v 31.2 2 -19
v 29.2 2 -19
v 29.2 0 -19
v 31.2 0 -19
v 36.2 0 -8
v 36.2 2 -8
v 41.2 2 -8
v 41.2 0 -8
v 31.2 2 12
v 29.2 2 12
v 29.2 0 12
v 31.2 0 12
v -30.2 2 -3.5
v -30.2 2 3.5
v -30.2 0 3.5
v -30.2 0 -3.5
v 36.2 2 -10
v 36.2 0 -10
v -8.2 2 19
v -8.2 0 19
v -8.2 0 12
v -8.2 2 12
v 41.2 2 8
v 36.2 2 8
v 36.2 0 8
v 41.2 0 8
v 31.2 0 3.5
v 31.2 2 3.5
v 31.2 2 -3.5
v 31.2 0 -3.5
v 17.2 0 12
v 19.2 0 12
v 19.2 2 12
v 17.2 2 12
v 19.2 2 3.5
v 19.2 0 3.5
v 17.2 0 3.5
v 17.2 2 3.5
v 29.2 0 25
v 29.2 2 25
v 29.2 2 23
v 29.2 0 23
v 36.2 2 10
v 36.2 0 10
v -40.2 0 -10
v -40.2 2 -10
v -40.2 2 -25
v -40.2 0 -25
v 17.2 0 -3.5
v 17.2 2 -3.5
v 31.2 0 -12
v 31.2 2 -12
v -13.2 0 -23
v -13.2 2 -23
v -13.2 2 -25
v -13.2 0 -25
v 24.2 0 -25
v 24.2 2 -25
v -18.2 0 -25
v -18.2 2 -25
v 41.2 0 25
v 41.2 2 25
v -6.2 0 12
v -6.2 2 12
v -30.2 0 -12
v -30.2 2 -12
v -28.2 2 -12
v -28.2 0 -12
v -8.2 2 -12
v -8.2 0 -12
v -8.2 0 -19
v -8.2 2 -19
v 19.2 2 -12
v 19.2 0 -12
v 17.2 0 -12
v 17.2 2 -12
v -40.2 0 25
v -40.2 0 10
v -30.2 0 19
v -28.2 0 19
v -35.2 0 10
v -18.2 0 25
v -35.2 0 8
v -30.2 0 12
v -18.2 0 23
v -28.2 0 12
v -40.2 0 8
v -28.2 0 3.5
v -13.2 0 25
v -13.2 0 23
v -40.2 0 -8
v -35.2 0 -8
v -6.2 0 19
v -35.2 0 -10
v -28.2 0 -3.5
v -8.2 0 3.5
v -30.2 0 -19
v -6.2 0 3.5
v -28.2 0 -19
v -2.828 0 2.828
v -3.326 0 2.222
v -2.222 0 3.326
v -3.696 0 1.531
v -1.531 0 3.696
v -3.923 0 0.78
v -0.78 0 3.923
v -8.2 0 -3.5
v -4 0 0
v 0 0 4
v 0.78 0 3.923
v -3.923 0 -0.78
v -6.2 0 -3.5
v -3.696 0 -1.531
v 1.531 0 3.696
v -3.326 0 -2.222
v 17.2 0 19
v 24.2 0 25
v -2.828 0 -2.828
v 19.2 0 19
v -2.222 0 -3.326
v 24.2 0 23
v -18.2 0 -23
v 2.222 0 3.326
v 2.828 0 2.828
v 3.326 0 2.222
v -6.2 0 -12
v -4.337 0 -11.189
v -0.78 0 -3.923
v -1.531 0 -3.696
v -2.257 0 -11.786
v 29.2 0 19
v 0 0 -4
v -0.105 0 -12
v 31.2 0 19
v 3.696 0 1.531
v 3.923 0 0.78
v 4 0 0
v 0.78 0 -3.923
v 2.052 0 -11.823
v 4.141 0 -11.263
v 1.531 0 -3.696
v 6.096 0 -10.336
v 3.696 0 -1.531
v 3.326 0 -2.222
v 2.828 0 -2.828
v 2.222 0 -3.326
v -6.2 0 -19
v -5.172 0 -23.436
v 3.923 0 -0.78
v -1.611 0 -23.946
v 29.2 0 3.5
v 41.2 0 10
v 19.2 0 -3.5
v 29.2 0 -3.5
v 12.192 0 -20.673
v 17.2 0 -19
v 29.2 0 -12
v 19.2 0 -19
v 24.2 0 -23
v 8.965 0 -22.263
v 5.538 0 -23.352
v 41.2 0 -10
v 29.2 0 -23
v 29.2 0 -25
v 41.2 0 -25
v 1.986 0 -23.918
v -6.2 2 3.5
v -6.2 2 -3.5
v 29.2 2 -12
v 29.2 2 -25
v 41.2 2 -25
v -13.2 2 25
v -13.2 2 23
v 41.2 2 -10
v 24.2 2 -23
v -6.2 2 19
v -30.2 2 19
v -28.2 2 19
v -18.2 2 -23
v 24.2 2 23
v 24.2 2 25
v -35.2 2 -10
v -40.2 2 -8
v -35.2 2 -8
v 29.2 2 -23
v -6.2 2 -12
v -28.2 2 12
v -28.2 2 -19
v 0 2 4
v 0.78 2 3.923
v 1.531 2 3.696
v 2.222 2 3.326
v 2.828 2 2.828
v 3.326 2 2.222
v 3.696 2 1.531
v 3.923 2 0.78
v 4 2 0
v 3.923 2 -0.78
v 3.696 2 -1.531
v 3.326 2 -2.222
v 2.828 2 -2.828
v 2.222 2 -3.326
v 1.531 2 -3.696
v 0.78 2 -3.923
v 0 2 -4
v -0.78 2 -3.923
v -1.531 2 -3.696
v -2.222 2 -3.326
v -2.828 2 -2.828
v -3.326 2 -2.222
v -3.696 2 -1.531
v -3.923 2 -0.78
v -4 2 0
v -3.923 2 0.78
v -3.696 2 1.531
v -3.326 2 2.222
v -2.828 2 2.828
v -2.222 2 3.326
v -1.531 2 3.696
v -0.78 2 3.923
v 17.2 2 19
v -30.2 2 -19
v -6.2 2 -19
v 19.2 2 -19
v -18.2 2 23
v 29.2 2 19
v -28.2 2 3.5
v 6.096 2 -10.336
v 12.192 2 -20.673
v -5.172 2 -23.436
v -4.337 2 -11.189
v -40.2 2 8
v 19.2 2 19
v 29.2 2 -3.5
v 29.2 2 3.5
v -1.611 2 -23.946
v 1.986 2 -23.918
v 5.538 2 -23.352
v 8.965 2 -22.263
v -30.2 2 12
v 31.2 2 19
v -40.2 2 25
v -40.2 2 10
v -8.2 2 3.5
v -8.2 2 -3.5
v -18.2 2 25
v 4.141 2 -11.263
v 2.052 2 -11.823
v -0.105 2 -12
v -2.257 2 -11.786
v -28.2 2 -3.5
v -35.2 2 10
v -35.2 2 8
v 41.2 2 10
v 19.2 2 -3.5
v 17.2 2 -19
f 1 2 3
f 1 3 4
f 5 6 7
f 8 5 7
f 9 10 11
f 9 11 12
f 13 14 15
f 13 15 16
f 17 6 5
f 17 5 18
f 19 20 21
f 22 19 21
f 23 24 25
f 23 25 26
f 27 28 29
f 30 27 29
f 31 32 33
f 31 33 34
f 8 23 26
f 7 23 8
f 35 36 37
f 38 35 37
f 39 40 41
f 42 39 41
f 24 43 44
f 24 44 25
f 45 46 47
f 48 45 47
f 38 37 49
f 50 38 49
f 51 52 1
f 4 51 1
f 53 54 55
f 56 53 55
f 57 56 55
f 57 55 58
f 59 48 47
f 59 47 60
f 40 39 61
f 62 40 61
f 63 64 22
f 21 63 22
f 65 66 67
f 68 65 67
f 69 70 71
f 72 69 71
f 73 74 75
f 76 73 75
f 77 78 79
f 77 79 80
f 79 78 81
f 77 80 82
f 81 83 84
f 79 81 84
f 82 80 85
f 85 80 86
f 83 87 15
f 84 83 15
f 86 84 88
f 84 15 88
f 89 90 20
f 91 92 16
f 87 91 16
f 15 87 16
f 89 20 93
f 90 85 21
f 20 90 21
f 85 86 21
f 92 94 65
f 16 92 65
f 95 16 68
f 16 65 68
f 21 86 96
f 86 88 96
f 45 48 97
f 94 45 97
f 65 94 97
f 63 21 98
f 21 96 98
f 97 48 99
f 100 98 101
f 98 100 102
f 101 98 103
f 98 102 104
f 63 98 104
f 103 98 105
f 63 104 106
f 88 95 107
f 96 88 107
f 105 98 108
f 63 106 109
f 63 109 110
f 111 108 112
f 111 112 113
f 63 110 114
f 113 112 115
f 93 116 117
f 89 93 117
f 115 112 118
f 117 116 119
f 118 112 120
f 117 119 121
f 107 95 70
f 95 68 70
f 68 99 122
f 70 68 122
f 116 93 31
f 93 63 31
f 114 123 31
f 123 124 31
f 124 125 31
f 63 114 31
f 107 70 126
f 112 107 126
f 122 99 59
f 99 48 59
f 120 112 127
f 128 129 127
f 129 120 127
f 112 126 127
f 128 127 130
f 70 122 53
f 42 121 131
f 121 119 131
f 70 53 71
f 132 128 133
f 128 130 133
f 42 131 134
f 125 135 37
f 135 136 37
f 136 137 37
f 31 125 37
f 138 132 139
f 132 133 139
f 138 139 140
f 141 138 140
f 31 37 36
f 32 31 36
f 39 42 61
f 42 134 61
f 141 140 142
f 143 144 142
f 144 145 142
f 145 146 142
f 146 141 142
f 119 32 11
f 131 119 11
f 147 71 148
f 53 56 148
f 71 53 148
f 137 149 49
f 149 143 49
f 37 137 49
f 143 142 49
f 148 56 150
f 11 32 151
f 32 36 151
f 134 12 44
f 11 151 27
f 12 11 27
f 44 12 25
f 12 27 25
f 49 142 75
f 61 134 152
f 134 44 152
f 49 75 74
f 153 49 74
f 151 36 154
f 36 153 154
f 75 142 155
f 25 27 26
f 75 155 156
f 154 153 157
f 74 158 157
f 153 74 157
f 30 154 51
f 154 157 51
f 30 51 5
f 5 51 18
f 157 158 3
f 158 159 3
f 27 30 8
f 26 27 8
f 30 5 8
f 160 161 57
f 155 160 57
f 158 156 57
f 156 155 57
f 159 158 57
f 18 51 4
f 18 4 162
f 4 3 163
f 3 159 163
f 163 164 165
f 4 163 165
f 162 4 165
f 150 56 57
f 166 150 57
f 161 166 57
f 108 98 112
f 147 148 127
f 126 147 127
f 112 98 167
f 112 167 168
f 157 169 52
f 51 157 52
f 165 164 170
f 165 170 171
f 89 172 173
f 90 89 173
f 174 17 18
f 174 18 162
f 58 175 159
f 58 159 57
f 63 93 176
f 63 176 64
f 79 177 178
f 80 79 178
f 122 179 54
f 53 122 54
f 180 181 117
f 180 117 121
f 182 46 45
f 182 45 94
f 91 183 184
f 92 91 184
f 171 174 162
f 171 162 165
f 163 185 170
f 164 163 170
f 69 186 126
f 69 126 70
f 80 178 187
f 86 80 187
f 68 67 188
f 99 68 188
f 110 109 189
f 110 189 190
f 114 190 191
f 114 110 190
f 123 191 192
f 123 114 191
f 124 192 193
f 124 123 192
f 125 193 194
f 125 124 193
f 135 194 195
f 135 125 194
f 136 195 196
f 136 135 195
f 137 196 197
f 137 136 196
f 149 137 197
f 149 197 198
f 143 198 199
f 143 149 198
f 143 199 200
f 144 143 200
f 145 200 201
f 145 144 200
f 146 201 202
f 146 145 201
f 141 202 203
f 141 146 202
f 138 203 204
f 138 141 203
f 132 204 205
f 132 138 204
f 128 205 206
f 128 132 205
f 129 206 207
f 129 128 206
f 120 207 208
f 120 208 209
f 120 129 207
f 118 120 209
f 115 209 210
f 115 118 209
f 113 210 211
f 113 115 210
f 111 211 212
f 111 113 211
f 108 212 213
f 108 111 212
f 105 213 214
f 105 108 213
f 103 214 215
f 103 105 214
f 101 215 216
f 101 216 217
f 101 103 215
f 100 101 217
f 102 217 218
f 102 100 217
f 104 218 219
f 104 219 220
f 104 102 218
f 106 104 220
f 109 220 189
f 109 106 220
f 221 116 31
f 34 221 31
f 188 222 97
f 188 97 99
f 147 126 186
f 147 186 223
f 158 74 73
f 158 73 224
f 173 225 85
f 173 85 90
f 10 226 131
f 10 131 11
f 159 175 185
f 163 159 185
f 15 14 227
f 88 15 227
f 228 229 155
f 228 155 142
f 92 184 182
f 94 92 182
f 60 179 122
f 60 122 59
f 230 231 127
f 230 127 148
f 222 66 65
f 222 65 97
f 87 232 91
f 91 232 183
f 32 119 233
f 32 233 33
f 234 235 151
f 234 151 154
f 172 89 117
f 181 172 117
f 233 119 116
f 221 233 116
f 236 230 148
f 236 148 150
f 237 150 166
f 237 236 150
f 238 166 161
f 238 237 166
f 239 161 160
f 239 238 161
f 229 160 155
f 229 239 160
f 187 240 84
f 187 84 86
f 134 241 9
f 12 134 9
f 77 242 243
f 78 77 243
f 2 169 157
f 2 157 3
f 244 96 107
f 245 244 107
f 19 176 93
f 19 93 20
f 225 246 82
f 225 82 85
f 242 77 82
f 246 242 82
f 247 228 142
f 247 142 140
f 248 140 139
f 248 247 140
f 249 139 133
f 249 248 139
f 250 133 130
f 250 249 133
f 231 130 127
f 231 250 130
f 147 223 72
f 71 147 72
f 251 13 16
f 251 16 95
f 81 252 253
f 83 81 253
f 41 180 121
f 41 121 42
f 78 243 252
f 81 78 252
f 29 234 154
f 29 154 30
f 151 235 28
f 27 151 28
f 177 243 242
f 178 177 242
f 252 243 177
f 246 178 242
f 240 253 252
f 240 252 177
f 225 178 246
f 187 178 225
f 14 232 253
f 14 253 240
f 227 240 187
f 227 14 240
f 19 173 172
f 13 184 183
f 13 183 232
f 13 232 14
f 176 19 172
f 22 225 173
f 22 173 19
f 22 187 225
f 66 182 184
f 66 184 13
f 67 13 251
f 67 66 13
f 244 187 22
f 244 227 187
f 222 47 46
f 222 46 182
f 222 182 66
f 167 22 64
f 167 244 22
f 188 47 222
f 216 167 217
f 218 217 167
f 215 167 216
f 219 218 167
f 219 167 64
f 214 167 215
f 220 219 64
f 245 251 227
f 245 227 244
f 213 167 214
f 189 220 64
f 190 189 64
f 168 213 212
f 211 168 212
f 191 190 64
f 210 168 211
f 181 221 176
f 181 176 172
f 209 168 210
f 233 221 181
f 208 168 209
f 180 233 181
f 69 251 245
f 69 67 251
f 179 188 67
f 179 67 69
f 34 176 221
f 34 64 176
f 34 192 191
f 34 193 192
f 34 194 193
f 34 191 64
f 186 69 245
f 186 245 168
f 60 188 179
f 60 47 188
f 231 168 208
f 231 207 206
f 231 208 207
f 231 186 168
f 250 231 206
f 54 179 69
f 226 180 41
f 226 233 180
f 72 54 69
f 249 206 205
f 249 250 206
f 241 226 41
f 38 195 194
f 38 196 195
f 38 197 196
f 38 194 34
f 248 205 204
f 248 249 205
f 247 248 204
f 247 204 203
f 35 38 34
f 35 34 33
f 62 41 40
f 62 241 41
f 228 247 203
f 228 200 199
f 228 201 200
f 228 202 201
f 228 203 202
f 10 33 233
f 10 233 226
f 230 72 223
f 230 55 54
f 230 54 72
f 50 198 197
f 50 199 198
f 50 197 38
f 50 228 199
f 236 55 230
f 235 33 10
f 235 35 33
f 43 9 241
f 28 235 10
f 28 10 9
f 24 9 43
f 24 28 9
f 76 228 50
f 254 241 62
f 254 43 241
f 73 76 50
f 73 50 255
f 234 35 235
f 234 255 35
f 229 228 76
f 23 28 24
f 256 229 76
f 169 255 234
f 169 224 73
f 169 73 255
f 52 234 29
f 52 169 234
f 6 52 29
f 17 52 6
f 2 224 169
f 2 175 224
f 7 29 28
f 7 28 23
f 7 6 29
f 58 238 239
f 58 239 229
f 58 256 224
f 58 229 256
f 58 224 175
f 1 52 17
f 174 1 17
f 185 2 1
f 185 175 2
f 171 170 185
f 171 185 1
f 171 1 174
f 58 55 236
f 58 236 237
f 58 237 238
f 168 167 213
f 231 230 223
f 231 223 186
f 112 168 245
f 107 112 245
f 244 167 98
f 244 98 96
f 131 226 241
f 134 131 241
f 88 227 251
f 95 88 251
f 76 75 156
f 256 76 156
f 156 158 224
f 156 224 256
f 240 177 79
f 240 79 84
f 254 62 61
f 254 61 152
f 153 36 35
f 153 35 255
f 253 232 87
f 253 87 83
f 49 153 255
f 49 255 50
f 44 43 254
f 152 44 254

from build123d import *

# Parameters (mm, degrees)
SKETCH2_W           = 100
SKETCH2_H           = 50
SKETCH2_R           = 4
BOSS_EXTRUDE1_DEPTH = 2
SKETCH5_W           = 2
SKETCH5_H           = 7
CUT_EXTRUDE3_DEPTH  = 2
CUT_EXTRUDE6_DEPTH  = 2
SKETCH11_W          = 5
SKETCH11_H          = 2
CUT_EXTRUDE7_DEPTH  = 2
SKETCH12_W          = 9.8
SKETCH12_H          = 50
SKETCH12_W_2        = 8.8
CUT_EXTRUDE8_DEPTH  = 6
SKETCH13_W          = 2
SKETCH13_H          = 7
SKETCH13_W_2        = 5
SKETCH13_H_2        = 2
CUT_EXTRUDE10_DEPTH = 6


with BuildPart() as part:
    # Sketch2 → Boss-Extrude1 (new body)
    with BuildSketch(Plane(origin=(0, 0, 0), x_dir=(1, 0, 0), z_dir=(0, 1, 0))):
        Rectangle(SKETCH2_W, SKETCH2_H)
        with Locations(Location((0, 0, 0), (0, 0, 270))):
            Circle(SKETCH2_R, mode=Mode.SUBTRACT)
    extrude(amount=BOSS_EXTRUDE1_DEPTH)

    # Sketch5 → Cut-Extrude3 (cut)
    with BuildSketch(Plane(origin=(0, 0, 0), x_dir=(-1, 0, 0), z_dir=(0, -1, 0))):
        with Locations((-18.2, -15.5)):
            Rectangle(SKETCH5_W, SKETCH5_H)
        with Locations((-18.2, 0)):
            Rectangle(SKETCH5_W, SKETCH5_H)
        with Locations((-18.2, 15.5)):
            Rectangle(SKETCH5_W, SKETCH5_H)
        with Locations((7.2, 15.5)):
            Rectangle(SKETCH5_W, SKETCH5_H)
        with Locations((7.2, 0)):
            Rectangle(SKETCH5_W, SKETCH5_H)
        with Locations((7.2, -15.5)):
            Rectangle(SKETCH5_W, SKETCH5_H)
    extrude(amount=-CUT_EXTRUDE3_DEPTH, mode=Mode.SUBTRACT)

    # Sketch10 → Cut-Extrude6 (cut)
    with BuildSketch(Plane(origin=(0, 2, 0), x_dir=(1, 0, 0), z_dir=(0, 1, 0))):
        with BuildLine():
            ThreePointArc((-5.171573663, 23.436186248), (3.772267489, 23.701687661), (12.191771414, 20.672704462))
            Line((12.191771414, 20.672704462), (6.095885707, 10.336352231))
            ThreePointArc((6.095885707, 10.336352231), (0.977437683, 11.960126069), (-4.336736478, 11.188955122))
            Line((-4.336736478, 11.188955122), (-5.171573663, 23.436186248))
        make_face()
    extrude(amount=-CUT_EXTRUDE6_DEPTH, mode=Mode.SUBTRACT)

    # Sketch11 → Cut-Extrude7 (cut)
    with BuildSketch(Plane(origin=(0, 2, 0), x_dir=(1, 0, 0), z_dir=(0, 1, 0))):
        with Locations((-15.7, -24)):
            Rectangle(SKETCH11_W, SKETCH11_H)
        with Locations((26.7, -24)):
            Rectangle(SKETCH11_W, SKETCH11_H)
        with Locations((26.7, 24)):
            Rectangle(SKETCH11_W, SKETCH11_H)
        with Locations((-15.7, 24)):
            Rectangle(SKETCH11_W, SKETCH11_H)
    extrude(amount=-CUT_EXTRUDE7_DEPTH, mode=Mode.SUBTRACT)

    # Sketch12 → Cut-Extrude8 (cut)
    with BuildSketch(Plane(origin=(0, 2, 0), x_dir=(1, 0, 0), z_dir=(0, 1, 0))):
        with Locations((-45.1, 0)):
            Rectangle(SKETCH12_W, SKETCH12_H)
        with Locations((45.6, 0)):
            Rectangle(SKETCH12_W_2, SKETCH12_H)
    extrude(amount=-CUT_EXTRUDE8_DEPTH, mode=Mode.SUBTRACT)

    # Sketch13 → Cut-Extrude10 (cut)
    with BuildSketch(Plane(origin=(0, 2, 0), x_dir=(1, 0, 0), z_dir=(0, 1, 0))):
        with Locations((-29.2, 15.5)):
            Rectangle(SKETCH13_W, SKETCH13_H)
        with Locations((-29.2, 0)):
            Rectangle(SKETCH13_W, SKETCH13_H)
        with Locations((-29.2, -15.5)):
            Rectangle(SKETCH13_W, SKETCH13_H)
        with Locations((30.2, 15.5)):
            Rectangle(SKETCH13_W, SKETCH13_H)
        with Locations((30.2, 0)):
            Rectangle(SKETCH13_W, SKETCH13_H)
        with Locations((30.2, -15.5)):
            Rectangle(SKETCH13_W, SKETCH13_H)
        with Locations((-37.7, 9)):
            Rectangle(SKETCH13_W_2, SKETCH13_H_2)
        with Locations((-37.7, -9)):
            Rectangle(SKETCH13_W_2, SKETCH13_H_2)
        with Locations((38.7, 9)):
            Rectangle(SKETCH13_W_2, SKETCH13_H_2)
        with Locations((38.7, -9)):
            Rectangle(SKETCH13_W_2, SKETCH13_H_2)
    extrude(amount=-CUT_EXTRUDE10_DEPTH, mode=Mode.SUBTRACT)


solid = part.part
